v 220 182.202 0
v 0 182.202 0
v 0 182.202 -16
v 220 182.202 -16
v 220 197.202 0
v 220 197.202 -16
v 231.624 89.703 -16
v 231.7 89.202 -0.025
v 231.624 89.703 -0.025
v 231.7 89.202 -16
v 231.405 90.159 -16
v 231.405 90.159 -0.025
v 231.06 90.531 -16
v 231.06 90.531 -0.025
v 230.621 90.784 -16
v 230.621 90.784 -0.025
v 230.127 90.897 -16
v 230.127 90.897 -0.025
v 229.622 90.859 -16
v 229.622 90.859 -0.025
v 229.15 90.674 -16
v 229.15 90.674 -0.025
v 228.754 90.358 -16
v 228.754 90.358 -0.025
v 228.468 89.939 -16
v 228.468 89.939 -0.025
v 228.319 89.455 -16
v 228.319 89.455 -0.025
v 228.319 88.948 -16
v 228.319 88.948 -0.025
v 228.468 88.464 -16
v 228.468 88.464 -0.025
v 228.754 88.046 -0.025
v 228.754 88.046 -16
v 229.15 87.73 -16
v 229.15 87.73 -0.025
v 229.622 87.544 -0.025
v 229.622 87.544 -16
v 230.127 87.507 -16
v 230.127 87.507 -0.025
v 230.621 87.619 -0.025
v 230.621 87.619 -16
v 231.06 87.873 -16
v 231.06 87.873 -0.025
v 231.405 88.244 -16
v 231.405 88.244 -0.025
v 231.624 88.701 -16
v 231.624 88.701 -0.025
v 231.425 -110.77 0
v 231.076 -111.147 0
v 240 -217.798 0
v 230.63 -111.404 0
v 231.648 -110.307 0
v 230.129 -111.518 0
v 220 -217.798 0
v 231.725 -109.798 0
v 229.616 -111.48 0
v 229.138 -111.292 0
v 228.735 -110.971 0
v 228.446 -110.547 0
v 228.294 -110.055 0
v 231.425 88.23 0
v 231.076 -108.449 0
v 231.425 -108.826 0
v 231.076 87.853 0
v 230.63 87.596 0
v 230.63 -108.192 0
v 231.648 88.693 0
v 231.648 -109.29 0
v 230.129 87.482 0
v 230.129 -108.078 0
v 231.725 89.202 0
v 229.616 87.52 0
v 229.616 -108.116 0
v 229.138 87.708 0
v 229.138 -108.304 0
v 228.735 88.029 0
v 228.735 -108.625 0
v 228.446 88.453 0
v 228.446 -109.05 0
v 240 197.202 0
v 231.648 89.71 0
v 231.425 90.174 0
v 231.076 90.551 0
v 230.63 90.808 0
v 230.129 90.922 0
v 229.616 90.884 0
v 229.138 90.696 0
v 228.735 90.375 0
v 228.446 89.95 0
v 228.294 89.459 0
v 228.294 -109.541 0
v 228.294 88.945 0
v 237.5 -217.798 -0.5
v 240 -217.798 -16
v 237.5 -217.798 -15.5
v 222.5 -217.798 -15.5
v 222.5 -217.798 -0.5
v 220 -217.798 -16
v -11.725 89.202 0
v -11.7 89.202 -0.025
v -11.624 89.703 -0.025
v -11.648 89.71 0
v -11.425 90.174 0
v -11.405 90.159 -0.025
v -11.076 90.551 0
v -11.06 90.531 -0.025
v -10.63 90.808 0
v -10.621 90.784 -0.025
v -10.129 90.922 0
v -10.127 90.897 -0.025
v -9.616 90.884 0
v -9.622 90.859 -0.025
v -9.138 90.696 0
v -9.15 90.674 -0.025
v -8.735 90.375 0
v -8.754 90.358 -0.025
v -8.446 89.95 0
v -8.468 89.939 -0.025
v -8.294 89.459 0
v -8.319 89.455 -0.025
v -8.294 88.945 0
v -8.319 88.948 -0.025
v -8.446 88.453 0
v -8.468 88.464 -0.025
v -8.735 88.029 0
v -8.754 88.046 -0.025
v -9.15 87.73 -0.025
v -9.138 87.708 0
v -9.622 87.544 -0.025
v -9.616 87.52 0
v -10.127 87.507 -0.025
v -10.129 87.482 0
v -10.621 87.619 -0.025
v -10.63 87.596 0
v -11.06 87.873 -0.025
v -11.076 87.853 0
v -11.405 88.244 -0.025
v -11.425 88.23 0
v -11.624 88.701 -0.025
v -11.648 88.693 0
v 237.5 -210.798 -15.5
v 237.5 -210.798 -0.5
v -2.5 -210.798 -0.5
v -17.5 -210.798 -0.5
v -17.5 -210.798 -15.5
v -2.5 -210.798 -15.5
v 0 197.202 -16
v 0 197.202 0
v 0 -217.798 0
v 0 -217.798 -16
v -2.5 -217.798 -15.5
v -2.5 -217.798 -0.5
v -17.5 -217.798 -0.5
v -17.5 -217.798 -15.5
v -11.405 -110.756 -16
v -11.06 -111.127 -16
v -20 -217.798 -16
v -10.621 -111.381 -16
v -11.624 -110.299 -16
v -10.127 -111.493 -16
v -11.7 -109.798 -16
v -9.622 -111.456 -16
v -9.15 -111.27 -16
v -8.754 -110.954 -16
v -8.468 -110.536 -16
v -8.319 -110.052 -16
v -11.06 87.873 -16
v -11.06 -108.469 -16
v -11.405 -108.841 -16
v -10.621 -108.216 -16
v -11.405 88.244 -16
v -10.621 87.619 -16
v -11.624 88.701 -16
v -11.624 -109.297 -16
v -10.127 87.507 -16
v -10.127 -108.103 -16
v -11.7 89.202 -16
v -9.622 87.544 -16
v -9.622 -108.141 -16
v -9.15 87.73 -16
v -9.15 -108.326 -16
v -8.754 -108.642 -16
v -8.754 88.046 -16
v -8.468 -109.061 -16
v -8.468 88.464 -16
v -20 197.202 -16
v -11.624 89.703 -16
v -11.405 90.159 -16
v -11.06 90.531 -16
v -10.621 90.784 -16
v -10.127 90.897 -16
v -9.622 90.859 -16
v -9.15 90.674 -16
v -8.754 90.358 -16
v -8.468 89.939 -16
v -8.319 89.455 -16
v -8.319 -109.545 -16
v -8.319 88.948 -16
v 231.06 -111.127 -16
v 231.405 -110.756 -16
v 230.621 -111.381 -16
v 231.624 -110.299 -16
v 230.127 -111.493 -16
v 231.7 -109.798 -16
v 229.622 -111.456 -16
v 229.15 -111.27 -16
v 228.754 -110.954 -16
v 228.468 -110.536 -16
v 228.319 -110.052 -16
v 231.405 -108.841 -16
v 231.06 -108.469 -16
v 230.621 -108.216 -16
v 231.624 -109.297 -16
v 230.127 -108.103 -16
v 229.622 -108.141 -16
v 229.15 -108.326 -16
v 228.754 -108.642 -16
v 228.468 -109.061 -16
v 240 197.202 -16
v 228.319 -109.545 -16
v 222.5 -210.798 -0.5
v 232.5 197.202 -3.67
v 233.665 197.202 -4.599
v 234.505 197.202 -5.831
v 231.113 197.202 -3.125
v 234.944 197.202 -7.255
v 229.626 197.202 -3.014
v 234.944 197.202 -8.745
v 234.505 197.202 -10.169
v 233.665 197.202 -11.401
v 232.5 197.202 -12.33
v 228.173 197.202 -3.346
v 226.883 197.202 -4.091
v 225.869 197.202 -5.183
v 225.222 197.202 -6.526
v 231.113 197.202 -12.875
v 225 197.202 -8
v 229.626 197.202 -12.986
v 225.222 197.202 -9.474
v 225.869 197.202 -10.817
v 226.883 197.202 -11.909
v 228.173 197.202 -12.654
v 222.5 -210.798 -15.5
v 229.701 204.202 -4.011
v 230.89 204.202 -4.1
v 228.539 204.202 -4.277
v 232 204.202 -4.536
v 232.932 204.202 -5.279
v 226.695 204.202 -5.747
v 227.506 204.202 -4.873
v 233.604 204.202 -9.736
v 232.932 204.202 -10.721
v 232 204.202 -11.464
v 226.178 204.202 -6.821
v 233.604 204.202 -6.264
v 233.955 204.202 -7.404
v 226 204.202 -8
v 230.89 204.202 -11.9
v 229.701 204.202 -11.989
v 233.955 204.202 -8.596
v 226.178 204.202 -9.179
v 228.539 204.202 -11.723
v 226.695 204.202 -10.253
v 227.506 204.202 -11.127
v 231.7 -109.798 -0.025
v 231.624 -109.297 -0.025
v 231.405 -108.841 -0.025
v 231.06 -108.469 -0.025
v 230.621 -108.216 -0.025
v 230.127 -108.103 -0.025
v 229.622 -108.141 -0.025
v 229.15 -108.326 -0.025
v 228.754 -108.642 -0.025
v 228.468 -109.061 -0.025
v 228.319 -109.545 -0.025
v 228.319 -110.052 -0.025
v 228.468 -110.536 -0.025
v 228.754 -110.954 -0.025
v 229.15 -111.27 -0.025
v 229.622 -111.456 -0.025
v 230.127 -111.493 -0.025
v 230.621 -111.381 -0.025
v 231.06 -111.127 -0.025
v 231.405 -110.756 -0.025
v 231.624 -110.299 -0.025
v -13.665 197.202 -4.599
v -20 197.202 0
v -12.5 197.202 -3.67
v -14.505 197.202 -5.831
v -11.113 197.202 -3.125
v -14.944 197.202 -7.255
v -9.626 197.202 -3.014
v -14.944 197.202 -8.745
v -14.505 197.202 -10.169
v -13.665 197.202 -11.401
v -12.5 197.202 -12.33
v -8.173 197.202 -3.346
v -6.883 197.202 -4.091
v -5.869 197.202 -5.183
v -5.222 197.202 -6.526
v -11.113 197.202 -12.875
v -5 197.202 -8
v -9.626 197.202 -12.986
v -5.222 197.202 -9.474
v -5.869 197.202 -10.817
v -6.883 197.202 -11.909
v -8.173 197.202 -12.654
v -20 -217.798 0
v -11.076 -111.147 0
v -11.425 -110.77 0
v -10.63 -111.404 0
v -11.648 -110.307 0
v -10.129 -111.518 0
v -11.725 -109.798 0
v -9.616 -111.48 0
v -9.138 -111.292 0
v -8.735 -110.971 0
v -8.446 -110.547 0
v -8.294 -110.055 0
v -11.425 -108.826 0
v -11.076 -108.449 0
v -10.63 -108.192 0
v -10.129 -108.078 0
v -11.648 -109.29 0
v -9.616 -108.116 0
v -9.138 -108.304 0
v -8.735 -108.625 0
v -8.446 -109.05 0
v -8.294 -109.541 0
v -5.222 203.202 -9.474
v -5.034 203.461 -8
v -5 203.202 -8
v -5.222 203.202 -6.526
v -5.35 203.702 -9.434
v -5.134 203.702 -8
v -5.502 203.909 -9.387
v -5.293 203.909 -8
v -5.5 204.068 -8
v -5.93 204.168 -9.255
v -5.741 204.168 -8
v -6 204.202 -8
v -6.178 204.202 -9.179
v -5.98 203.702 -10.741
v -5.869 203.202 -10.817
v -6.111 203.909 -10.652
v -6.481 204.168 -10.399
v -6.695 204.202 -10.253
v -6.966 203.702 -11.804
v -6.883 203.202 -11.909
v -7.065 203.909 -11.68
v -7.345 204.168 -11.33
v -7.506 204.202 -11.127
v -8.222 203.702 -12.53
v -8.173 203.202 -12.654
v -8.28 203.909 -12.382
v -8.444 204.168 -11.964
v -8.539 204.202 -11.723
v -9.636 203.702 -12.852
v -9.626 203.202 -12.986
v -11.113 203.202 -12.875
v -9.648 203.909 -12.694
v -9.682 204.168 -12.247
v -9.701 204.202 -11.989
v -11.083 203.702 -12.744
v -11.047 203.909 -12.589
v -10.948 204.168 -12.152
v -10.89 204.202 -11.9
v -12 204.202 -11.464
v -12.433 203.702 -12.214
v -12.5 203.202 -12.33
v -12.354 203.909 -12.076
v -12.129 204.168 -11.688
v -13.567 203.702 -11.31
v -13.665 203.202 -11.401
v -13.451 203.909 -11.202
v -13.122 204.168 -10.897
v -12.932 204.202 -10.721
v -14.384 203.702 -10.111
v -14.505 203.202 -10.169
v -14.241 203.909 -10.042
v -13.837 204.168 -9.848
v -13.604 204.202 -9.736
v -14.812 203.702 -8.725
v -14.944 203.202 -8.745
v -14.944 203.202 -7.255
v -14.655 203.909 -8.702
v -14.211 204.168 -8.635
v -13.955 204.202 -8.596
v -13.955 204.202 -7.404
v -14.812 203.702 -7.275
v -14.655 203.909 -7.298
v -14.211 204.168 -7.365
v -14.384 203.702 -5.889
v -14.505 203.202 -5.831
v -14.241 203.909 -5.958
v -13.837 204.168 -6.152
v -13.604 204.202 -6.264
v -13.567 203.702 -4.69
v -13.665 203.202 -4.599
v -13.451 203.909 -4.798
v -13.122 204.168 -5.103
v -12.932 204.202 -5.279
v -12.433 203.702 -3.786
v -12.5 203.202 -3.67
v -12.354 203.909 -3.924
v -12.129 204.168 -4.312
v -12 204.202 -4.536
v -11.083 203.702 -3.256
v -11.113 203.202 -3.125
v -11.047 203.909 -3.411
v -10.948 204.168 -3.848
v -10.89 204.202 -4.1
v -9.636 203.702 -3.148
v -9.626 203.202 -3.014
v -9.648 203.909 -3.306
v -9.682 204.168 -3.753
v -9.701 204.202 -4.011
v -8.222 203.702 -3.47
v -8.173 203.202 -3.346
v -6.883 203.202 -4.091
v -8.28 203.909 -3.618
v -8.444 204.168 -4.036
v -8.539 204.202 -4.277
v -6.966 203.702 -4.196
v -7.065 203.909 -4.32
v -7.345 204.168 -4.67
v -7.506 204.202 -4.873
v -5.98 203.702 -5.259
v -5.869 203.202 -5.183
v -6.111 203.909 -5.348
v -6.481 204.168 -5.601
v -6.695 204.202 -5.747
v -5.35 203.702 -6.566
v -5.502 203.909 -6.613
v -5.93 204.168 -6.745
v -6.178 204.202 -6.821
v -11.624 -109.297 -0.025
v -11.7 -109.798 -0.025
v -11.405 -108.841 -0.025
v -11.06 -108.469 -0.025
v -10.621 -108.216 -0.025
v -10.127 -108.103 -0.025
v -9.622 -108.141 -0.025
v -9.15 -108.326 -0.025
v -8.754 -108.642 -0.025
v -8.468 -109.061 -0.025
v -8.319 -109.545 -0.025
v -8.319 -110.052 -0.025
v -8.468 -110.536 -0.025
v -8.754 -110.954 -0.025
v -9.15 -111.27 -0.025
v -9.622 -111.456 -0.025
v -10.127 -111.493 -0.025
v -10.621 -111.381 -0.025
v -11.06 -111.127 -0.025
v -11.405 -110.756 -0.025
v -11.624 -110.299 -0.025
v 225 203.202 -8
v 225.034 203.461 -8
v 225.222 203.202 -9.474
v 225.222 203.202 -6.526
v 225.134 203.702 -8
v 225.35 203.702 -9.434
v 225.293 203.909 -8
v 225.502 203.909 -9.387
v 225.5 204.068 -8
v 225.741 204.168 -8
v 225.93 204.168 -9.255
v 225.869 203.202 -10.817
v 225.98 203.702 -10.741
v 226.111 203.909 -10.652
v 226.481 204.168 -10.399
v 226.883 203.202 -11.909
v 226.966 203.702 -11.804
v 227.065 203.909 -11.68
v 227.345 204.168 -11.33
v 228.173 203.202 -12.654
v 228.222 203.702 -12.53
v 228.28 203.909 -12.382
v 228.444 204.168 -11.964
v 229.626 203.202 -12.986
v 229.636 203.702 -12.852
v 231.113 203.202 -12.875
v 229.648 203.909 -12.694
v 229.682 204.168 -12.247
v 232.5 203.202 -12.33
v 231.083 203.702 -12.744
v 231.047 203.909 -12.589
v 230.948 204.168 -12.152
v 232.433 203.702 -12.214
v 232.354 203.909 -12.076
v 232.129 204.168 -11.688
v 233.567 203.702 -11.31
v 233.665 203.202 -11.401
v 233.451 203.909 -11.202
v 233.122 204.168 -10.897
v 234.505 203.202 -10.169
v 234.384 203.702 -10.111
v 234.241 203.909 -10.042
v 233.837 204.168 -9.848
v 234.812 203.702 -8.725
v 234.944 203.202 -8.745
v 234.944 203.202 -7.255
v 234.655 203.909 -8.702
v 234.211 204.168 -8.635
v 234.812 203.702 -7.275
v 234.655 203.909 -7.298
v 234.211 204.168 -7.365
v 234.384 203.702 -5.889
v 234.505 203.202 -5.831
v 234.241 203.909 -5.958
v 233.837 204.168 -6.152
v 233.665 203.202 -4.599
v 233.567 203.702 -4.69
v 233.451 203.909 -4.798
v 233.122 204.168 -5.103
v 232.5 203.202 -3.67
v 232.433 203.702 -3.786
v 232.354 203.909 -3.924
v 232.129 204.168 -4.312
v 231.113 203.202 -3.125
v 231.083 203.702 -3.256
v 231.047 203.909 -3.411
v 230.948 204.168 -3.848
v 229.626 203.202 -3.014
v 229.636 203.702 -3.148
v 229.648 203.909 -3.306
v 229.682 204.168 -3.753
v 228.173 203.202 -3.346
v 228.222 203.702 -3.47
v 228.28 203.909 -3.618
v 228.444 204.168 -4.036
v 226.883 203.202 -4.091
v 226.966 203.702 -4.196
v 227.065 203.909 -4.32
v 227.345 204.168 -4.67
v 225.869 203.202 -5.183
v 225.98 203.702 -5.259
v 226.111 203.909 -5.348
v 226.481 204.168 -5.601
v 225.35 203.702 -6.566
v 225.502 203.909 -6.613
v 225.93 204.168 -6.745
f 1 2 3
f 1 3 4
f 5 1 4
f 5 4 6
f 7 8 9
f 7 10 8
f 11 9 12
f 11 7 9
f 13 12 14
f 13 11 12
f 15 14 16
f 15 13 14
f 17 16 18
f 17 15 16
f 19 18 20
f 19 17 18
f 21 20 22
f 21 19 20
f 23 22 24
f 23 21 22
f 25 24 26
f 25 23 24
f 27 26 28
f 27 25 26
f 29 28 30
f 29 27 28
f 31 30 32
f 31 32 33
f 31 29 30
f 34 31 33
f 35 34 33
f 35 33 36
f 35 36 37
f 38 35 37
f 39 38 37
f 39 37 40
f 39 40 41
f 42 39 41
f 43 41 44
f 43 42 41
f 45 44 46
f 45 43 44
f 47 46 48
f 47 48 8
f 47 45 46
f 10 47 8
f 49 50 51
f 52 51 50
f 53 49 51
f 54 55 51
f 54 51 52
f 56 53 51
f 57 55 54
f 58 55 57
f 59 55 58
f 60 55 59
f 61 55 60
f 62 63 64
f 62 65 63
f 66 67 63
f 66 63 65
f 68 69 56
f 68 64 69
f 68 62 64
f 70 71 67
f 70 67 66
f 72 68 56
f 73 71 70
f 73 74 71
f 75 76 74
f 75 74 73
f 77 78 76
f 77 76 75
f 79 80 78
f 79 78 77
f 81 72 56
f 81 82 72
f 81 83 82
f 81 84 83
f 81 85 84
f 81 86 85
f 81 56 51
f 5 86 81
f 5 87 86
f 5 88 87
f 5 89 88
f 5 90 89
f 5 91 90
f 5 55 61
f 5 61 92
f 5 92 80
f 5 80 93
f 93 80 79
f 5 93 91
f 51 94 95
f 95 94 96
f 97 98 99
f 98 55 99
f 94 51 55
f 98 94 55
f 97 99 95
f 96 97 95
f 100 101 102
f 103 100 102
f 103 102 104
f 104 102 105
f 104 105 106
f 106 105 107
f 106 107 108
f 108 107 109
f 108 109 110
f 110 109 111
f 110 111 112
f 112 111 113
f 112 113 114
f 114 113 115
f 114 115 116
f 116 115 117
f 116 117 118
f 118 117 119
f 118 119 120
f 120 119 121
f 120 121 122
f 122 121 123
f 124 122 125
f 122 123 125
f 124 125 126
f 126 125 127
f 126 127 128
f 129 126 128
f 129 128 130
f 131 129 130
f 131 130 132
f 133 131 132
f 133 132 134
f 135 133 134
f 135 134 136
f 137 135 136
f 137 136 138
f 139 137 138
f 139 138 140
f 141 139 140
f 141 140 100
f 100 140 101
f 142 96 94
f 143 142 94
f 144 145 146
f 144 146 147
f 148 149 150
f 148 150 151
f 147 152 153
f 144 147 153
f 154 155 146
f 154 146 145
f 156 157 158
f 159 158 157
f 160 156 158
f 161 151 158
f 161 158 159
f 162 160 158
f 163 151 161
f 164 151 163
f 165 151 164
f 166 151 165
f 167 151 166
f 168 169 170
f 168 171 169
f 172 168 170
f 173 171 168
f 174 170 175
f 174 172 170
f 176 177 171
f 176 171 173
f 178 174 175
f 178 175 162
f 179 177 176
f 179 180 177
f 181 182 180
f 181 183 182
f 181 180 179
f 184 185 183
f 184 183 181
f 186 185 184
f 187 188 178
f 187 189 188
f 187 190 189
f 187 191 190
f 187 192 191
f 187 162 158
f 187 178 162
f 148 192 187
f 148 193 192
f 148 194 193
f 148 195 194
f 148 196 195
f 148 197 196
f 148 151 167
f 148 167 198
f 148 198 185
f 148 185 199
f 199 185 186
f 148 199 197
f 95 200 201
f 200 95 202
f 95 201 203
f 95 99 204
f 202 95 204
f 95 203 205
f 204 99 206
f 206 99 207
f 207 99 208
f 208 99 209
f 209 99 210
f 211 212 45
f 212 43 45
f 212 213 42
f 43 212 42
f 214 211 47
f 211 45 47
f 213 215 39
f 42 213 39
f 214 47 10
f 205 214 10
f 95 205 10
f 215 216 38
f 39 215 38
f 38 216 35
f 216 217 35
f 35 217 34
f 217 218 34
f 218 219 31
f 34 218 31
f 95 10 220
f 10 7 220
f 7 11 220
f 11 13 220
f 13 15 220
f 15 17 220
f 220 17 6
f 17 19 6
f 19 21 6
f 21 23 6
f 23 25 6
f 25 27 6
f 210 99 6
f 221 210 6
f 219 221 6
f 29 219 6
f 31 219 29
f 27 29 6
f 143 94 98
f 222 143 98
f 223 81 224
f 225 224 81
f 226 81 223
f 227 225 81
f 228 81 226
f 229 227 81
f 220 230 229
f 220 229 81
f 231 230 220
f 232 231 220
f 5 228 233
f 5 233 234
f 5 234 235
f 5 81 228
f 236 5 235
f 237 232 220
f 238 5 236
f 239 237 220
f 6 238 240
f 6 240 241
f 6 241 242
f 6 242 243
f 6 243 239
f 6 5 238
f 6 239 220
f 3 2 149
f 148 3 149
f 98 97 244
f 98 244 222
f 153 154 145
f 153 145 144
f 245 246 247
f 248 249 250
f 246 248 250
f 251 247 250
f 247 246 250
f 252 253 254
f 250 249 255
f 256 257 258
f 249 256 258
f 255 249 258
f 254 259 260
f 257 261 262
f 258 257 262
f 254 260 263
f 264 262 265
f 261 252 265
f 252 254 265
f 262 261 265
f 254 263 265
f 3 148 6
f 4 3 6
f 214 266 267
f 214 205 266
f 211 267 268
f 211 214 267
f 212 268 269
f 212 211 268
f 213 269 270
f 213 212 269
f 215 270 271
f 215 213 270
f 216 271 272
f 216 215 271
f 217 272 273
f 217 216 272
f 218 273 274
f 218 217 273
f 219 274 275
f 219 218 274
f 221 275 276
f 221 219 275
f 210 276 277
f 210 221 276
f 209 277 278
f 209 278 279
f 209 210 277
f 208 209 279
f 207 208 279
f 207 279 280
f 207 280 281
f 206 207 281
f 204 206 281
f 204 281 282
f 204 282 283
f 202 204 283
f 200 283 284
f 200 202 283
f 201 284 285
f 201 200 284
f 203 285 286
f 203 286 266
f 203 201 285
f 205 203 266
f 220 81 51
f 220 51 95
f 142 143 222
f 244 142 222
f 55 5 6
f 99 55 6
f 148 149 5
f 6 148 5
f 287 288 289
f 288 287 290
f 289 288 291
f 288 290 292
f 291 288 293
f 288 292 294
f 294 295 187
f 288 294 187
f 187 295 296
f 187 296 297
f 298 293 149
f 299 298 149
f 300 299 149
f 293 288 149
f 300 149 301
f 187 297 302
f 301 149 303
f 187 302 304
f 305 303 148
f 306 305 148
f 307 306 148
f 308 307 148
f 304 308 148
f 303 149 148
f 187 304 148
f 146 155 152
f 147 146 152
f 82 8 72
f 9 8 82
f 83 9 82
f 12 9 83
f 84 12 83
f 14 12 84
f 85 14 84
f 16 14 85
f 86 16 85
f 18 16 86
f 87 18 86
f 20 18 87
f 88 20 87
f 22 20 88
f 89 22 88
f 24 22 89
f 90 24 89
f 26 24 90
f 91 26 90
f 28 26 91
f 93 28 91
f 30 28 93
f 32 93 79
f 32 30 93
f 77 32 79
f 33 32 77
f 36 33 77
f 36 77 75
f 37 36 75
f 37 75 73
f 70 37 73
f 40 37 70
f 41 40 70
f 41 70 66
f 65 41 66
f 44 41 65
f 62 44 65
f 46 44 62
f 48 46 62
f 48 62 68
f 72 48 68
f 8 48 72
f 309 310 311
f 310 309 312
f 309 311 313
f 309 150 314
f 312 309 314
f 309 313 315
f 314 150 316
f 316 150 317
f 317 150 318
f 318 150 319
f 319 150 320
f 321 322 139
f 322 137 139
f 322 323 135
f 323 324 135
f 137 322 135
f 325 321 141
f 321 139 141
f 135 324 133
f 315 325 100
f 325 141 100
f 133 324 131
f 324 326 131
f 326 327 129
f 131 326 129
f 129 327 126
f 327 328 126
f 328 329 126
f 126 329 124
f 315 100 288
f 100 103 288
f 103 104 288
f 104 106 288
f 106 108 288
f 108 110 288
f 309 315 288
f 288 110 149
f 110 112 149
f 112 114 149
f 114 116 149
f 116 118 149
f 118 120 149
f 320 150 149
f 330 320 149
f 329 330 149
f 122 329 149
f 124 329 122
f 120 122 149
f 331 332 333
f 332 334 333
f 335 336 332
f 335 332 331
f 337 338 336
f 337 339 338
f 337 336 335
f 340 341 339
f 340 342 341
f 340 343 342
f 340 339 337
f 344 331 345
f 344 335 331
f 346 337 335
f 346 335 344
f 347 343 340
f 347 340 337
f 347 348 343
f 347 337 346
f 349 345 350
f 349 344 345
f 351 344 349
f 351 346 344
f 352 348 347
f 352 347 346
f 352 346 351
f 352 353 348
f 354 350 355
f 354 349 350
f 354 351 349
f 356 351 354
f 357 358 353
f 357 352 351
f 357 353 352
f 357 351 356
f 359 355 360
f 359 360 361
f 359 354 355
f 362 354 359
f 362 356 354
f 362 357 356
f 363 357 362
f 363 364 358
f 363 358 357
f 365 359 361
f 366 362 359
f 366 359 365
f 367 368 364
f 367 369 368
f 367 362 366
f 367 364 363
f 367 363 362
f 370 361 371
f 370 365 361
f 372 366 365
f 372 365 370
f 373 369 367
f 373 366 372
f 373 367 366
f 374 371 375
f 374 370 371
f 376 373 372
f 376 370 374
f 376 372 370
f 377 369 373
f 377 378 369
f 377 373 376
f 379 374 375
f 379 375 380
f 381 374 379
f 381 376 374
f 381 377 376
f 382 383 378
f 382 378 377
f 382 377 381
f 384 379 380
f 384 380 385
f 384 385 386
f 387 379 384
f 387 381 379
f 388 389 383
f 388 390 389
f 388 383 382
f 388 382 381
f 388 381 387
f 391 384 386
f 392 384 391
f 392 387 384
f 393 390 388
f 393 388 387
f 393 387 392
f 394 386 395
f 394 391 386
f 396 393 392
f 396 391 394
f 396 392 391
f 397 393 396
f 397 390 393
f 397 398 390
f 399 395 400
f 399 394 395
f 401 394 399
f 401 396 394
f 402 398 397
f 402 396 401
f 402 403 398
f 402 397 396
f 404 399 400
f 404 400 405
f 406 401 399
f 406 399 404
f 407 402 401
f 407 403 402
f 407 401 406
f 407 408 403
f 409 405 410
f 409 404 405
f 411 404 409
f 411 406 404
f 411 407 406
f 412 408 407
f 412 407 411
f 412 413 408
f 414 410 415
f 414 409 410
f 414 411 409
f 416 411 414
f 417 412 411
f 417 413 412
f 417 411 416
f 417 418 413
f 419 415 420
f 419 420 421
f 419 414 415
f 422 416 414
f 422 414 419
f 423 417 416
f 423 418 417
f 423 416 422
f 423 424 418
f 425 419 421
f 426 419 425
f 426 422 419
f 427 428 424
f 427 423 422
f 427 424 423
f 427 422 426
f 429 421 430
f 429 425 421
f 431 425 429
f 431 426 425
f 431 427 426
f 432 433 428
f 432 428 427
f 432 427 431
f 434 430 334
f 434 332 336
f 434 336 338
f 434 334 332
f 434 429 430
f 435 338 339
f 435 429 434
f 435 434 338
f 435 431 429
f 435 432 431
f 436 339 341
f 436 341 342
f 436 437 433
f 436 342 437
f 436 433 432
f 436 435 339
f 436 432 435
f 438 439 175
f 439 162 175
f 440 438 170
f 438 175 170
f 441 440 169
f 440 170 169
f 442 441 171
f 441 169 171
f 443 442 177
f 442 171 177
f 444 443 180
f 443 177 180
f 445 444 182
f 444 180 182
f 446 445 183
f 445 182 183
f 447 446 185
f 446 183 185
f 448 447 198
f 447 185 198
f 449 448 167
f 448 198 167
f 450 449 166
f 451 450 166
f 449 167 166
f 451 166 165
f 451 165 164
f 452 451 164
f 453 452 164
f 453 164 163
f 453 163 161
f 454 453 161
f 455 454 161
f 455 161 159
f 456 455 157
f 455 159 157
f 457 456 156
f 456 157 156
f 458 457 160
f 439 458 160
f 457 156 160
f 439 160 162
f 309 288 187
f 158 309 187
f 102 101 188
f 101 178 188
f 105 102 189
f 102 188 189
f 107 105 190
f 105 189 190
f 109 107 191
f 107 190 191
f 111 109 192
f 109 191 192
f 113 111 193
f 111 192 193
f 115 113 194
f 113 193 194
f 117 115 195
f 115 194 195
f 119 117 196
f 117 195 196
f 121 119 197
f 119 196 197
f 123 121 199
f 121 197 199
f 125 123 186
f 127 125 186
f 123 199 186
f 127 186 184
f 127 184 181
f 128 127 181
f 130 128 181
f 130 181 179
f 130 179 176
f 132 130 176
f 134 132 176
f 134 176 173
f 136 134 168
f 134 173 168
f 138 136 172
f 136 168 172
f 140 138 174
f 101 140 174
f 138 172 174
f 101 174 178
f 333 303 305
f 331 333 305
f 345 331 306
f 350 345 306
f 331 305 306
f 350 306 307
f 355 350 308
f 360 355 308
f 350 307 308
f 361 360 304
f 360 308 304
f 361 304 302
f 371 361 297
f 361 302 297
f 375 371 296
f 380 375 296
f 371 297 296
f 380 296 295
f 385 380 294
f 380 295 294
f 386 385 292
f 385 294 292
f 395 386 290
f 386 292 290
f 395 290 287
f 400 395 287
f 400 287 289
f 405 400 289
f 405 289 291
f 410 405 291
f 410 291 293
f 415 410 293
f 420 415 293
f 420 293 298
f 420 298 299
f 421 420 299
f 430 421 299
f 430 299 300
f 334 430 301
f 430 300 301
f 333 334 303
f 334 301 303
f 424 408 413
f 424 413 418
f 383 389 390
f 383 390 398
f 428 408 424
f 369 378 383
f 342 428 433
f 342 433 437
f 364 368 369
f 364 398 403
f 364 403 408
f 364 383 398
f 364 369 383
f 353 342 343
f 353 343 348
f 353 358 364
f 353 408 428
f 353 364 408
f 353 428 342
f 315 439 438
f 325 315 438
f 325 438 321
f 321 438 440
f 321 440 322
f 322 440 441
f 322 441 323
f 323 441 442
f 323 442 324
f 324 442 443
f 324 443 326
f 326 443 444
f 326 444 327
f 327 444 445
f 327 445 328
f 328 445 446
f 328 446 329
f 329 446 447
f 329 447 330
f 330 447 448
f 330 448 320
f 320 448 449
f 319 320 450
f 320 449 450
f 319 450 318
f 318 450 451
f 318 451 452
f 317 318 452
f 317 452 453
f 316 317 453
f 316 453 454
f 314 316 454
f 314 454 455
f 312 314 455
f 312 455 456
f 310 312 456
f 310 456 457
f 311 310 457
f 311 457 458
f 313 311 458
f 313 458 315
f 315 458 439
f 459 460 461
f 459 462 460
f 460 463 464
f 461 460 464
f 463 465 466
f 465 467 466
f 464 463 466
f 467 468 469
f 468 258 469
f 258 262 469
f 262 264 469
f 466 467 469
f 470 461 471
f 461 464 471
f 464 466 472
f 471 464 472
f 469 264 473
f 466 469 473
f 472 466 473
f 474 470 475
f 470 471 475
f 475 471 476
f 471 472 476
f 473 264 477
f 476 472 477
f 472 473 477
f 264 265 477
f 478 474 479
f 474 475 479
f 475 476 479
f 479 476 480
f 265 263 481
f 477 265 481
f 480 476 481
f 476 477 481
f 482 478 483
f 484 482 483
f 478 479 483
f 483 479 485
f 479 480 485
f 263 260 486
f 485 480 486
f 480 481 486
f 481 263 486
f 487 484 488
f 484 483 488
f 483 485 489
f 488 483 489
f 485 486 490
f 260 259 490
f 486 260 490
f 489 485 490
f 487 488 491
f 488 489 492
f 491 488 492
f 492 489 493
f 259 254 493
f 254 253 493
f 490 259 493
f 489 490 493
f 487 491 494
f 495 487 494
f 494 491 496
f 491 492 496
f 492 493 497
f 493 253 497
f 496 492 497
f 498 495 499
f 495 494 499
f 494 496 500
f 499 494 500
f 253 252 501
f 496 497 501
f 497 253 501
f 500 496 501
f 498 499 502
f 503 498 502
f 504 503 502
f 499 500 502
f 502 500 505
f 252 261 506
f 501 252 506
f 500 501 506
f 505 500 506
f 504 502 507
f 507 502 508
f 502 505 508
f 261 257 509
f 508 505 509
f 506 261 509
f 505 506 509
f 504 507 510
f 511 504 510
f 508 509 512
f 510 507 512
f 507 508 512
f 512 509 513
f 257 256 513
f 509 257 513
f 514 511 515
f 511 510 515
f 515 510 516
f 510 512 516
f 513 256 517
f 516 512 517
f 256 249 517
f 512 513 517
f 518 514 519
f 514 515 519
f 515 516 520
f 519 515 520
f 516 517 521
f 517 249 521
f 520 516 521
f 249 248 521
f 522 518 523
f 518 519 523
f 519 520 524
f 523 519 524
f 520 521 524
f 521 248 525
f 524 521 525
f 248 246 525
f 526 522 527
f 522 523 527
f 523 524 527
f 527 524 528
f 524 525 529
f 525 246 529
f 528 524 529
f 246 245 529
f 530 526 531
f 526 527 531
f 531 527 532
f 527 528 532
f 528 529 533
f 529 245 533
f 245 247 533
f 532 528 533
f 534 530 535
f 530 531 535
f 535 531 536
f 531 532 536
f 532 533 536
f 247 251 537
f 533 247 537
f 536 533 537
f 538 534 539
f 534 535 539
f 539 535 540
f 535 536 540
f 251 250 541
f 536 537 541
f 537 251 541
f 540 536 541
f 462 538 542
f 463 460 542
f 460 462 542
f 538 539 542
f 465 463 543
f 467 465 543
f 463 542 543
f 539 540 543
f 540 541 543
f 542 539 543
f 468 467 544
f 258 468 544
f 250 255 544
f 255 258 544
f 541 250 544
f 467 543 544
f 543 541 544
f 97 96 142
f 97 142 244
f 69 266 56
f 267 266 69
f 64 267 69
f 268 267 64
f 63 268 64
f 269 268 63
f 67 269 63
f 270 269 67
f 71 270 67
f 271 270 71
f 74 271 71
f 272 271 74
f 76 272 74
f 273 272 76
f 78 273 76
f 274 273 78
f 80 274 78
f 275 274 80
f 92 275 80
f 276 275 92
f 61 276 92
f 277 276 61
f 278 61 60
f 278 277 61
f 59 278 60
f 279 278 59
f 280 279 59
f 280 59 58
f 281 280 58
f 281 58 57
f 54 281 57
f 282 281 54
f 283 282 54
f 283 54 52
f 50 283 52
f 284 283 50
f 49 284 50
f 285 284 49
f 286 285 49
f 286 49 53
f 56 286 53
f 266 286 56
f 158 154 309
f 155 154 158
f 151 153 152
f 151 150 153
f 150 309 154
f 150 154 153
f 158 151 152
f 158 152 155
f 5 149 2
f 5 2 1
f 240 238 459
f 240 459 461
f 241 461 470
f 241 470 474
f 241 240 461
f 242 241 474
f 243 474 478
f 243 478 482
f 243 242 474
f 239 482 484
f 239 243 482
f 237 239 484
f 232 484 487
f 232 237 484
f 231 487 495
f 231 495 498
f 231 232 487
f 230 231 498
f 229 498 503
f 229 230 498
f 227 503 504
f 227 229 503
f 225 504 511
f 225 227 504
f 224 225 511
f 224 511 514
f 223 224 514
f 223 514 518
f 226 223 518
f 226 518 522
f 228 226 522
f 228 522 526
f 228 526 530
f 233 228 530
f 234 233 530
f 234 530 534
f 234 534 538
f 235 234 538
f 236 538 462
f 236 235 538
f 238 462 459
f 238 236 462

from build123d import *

# Parameters (mm, degrees)
SKETCH1_W                      = 16
SKETCH1_H                      = 415
BOSS_EXTRUDE1_DEPTH            = 20
SKETCH5_R                      = 5
BOSS_EXTRUDE2_DEPTH            = 7
FILLET1_R                      = 1
M3_CLEARANCE_HOLE1_D           = 3.4
M3_CLEARANCE_HOLE1_CSINK_D     = 3.45
M3_CLEARANCE_HOLE1_CSINK_ANGLE = 90
SKETCH8_W                      = 15
SKETCH8_H                      = 15
CUT_EXTRUDE1_DEPTH             = 7
SKETCH14_W                     = 220
SKETCH14_H                     = 15
BOSS_EXTRUDE3_DEPTH            = 16


with BuildPart() as part:
    # Sketch1 → Boss-Extrude1 (new body)
    with BuildSketch(Plane(origin=(0, 0, 0), x_dir=(0, 0, -1), z_dir=(1, 0, 0))):
        with Locations((8, -10.298148148)):
            Rectangle(SKETCH1_W, SKETCH1_H)
    extrude(amount=-BOSS_EXTRUDE1_DEPTH)

    # Sketch5 → Boss-Extrude2 (add)
    with BuildSketch(Plane(origin=(0, 197.201851852, 0), x_dir=(1, 0, 0), z_dir=(0, 1, 0))):
        with Locations((-10, 8)):
            Circle(SKETCH5_R)
    extrude(amount=BOSS_EXTRUDE2_DEPTH)

    # Fillet1
    fillet1_edges = [part.edges().sort_by_distance(p)[0] for p in [
        (-15, 204.201851852, -8),
    ]]
    fillet(fillet1_edges, radius=FILLET1_R)

    # M3 Clearance Hole1 (through all)
    with Locations(Plane(origin=(-10, 89.201851852, 0), x_dir=(1, 0, 0), z_dir=(0, 0, 1))):
        with Locations((0, 0), (0, -199)):
            CounterSinkHole(M3_CLEARANCE_HOLE1_D / 2, M3_CLEARANCE_HOLE1_CSINK_D / 2, counter_sink_angle=M3_CLEARANCE_HOLE1_CSINK_ANGLE)

    # Sketch8 → Cut-Extrude1 (cut)
    with BuildSketch(Plane.XZ.offset(217.798148148)):
        with Locations((-10, -8)):
            Rectangle(SKETCH8_W, SKETCH8_H)
    extrude(amount=-CUT_EXTRUDE1_DEPTH, mode=Mode.SUBTRACT)


with BuildPart() as body_2:
    # Mirror7: mirrored copy
    add(part.part.mirror(Plane.ZY.offset(-110)))


with BuildPart() as body_3:
    # Sketch14 → Boss-Extrude3 (new body)
    with BuildSketch(Plane.XY):
        with Locations((110, 189.701851852)):
            Rectangle(SKETCH14_W, SKETCH14_H)
    extrude(amount=-BOSS_EXTRUDE3_DEPTH)


solid = Compound([part.part, body_2.part, body_3.part])
